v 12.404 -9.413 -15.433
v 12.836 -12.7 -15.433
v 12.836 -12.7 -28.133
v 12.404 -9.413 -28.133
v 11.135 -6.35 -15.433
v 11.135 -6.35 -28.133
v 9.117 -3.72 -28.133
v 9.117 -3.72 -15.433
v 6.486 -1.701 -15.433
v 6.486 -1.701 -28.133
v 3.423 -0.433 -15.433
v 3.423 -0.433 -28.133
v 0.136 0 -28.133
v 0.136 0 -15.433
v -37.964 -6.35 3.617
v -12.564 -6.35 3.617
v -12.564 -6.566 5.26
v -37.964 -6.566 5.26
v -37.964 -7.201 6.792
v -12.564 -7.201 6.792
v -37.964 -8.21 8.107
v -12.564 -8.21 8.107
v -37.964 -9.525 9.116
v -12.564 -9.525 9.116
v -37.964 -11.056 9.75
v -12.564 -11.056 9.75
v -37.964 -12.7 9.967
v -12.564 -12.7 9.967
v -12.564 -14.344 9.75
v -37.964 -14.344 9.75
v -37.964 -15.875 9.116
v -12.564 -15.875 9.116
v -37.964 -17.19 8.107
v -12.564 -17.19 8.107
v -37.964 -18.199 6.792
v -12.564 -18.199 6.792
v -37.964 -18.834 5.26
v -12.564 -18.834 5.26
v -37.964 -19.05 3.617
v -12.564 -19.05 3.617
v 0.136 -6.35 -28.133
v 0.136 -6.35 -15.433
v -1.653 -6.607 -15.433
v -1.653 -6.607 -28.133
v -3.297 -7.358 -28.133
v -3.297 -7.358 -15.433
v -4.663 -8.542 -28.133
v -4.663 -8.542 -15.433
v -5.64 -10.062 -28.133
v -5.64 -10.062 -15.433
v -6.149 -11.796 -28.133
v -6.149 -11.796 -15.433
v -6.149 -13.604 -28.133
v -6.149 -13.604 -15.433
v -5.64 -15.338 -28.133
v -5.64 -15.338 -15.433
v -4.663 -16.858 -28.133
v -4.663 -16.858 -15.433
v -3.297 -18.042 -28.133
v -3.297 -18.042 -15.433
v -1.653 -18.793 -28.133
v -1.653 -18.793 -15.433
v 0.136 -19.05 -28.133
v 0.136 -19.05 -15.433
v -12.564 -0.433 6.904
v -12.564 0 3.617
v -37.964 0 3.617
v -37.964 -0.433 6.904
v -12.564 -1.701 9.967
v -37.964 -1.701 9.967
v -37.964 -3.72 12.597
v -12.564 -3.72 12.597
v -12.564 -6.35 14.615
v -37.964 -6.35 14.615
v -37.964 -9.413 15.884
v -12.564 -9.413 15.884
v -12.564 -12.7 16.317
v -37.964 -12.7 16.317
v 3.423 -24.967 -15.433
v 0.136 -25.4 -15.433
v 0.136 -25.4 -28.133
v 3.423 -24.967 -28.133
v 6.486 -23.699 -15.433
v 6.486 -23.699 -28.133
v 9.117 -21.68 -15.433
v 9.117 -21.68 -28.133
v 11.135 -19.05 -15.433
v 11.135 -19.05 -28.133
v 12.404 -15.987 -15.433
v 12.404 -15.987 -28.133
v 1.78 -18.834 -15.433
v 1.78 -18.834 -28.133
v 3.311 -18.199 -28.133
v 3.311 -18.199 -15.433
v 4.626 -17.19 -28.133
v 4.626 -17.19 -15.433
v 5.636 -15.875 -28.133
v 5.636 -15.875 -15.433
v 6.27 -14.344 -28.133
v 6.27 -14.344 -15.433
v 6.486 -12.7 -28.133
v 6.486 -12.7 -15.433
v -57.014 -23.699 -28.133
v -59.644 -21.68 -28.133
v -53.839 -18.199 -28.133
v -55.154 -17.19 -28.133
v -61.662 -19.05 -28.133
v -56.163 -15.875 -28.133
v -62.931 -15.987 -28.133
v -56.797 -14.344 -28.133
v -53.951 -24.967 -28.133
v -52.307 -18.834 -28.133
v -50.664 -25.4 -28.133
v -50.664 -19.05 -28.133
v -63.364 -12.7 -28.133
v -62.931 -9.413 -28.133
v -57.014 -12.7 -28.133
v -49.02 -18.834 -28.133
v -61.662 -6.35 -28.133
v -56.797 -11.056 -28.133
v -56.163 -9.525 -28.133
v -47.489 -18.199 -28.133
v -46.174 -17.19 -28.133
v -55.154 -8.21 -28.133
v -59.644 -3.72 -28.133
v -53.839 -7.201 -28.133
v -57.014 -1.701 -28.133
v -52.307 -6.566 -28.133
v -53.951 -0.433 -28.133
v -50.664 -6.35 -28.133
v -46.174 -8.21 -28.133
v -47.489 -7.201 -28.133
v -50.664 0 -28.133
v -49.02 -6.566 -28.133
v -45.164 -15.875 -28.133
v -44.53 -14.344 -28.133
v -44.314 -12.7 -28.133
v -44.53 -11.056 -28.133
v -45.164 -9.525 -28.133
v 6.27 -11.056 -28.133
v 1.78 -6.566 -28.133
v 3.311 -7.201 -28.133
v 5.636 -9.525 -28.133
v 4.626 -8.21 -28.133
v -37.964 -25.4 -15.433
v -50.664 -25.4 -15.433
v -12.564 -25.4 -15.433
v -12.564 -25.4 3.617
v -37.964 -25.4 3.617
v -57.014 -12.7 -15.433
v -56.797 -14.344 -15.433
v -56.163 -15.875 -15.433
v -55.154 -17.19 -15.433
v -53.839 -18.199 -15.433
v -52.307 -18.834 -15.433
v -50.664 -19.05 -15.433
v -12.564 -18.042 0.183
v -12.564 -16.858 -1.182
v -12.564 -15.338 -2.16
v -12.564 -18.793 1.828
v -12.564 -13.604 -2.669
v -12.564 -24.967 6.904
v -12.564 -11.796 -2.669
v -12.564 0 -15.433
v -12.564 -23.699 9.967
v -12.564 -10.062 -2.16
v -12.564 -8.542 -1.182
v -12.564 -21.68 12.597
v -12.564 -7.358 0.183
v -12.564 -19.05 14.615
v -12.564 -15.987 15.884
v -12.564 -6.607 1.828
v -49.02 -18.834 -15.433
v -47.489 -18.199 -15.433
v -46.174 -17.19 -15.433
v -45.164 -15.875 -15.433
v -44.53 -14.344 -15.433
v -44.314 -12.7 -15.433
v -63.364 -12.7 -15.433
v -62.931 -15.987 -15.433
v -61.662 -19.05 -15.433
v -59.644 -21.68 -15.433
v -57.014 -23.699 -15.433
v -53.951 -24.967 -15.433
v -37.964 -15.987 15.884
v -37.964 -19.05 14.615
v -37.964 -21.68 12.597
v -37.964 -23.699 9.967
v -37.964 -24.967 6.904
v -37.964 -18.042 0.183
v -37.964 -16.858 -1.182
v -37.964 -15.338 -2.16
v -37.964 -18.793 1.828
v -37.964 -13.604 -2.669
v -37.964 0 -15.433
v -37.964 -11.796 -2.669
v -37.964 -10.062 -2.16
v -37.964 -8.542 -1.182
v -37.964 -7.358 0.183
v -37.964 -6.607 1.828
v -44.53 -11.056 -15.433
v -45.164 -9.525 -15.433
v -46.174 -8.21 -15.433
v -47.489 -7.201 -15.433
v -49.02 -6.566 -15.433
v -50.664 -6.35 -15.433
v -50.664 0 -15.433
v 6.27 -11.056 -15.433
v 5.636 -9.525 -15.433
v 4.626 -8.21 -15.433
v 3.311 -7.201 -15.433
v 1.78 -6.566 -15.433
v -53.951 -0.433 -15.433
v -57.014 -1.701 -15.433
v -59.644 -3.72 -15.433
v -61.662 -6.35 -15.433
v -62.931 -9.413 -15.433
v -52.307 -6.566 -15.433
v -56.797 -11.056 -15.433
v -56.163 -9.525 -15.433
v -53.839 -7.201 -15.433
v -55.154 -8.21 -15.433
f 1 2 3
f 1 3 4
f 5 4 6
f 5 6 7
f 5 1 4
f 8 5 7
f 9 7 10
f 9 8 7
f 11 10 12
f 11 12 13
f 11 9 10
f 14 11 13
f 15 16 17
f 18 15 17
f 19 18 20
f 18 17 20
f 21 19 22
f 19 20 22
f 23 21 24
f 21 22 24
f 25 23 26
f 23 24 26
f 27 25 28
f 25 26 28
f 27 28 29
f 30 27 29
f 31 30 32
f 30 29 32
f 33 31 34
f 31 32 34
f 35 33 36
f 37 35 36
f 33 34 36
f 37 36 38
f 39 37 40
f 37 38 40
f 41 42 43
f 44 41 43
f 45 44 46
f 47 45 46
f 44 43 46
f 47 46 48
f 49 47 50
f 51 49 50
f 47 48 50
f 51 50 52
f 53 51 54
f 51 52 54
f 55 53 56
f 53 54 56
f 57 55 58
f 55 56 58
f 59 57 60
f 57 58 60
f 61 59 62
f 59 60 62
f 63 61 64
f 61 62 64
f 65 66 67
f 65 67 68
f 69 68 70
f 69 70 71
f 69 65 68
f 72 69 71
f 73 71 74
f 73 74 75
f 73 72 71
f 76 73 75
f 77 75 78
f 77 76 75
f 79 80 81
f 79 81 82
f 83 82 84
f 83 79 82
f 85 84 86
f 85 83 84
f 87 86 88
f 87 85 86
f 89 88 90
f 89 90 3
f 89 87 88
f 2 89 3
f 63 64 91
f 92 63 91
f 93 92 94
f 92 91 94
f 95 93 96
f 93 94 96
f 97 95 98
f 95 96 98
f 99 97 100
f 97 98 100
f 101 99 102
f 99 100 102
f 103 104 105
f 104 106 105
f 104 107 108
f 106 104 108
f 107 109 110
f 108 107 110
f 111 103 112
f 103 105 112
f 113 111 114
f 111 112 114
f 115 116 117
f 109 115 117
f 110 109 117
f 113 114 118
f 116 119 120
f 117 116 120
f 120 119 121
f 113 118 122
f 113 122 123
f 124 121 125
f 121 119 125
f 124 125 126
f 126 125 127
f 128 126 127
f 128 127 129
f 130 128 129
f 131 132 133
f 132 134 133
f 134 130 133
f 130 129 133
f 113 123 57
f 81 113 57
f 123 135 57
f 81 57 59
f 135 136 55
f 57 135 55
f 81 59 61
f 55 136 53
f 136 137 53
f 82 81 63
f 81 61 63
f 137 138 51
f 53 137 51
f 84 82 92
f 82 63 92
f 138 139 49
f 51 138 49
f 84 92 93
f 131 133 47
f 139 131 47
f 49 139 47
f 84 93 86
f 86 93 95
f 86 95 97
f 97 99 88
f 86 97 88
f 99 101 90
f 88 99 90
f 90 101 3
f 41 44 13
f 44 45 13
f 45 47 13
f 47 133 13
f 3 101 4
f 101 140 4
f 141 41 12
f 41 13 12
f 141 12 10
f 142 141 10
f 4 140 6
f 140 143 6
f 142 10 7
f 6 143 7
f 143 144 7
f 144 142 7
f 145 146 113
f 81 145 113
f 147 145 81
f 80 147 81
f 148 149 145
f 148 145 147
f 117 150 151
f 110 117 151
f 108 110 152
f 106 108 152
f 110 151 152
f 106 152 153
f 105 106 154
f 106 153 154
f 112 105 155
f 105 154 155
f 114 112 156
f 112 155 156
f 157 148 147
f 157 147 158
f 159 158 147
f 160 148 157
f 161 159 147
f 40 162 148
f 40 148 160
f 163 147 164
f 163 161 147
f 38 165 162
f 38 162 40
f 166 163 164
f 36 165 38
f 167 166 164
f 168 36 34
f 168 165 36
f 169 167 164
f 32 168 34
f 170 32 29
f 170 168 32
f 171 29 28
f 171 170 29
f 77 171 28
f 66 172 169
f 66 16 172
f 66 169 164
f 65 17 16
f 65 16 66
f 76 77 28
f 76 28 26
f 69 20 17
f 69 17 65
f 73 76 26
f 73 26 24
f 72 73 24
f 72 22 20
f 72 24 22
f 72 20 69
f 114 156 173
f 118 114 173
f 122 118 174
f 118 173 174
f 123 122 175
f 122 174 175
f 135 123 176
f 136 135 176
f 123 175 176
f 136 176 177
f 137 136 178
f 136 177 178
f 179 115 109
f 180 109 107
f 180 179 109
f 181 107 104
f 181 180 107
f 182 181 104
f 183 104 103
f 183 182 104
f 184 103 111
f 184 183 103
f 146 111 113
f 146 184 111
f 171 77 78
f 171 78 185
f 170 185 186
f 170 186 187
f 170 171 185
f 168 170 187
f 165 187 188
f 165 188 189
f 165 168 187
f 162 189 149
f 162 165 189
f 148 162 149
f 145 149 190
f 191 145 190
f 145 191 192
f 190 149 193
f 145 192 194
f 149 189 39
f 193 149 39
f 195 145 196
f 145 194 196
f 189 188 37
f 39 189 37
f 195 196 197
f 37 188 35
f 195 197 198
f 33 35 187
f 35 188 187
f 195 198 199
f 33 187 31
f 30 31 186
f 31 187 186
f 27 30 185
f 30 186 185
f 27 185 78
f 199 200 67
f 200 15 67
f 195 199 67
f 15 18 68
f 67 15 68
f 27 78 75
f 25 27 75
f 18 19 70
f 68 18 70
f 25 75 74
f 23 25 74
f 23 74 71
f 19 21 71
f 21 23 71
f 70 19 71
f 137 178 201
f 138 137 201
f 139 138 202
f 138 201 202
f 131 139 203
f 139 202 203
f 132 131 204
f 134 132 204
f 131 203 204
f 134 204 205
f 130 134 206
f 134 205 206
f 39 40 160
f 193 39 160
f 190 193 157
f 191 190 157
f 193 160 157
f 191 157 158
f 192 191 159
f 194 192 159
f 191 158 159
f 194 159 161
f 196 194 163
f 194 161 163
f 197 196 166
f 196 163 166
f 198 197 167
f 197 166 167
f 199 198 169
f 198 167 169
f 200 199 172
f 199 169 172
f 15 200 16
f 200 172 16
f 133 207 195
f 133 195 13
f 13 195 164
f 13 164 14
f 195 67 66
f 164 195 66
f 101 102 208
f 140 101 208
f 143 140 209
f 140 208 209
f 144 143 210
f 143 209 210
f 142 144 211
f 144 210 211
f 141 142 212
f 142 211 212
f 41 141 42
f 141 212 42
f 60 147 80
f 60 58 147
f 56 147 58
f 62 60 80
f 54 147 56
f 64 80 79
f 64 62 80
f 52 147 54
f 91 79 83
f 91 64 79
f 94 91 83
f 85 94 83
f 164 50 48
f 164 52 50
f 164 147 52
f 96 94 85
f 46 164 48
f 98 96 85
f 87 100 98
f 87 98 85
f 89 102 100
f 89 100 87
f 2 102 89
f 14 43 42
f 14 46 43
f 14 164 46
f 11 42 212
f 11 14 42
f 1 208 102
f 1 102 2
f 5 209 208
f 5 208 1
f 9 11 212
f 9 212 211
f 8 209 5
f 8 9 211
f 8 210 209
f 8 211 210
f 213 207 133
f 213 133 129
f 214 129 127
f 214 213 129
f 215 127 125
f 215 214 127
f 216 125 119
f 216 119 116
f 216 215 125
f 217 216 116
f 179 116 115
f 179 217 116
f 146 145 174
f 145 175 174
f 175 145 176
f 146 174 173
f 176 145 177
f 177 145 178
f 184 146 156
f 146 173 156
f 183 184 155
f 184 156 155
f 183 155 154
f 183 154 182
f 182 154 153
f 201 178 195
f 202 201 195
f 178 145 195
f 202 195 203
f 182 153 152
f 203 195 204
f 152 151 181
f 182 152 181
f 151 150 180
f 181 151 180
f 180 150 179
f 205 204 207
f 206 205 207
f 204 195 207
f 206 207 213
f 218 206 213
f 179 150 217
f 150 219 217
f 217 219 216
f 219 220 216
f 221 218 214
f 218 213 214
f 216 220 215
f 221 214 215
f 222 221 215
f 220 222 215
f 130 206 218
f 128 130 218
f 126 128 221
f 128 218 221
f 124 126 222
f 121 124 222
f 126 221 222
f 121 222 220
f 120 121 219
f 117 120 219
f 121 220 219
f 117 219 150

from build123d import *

# Parameters (mm, degrees)
F1_DEPTH = 25.4
F3_DEPTH = 12.7
F5_DEPTH = 25.4
F7_DEPTH = 25.4
F9_DEPTH = 12.7


with BuildPart() as f1:
    # F0 (on Front) → F1 (new body)
    with BuildSketch(Plane.XZ):
        Polygon((-37.9636640911, -15.4334478322), (-50.6636640911, -15.4334478322), (-50.6636640911, -28.1334478322), (0.1363359089, -28.1334478322), (0.1363359089, -15.4334478322), (-12.5636640911, -15.4334478322), (-12.5636640911, 3.6165521678), (-37.9636640911, 3.6165521678), align=None)
    extrude(amount=F1_DEPTH)

    # F2 (on face) → F3 (join)
    with BuildSketch(Plane.XY.offset(-15.4334478322)):
        with BuildLine():
            ThreePointArc((12.8363359089, -12.7), (9.11659203, -3.7197438789), (0.1363359089, 0))
            Line((0.1363359089, 0), (0.1363359089, -12.7))
            Line((0.1363359089, -12.7), (12.8363359089, -12.7))
        make_face()
        with BuildLine():
            Line((12.8363359089, -12.7), (0.1363359089, -12.7))
            Line((0.1363359089, -12.7), (0.1363359089, -25.4))
            ThreePointArc((0.1363359089, -25.4), (9.11659203, -21.6802561211), (12.8363359089, -12.7))
        make_face()
        with BuildLine():
            Line((-50.6636640911, -12.7), (-50.6636640911, 0))
            ThreePointArc((-50.6636640911, 0), (-59.6439202122, -3.7197438789), (-63.3636640911, -12.7))
            Line((-63.3636640911, -12.7), (-50.6636640911, -12.7))
        make_face()
        with BuildLine():
            Line((-50.6636640911, -25.4), (-50.6636640911, -12.7))
            Line((-50.6636640911, -12.7), (-63.3636640911, -12.7))
            ThreePointArc((-63.3636640911, -12.7), (-59.6439202122, -21.6802561211), (-50.6636640911, -25.4))
        make_face()
    extrude(amount=-F3_DEPTH)

    # F4 (on face) → F5 (join)
    with BuildSketch(Plane.YZ.offset(-12.5636640911)):
        with BuildLine():
            ThreePointArc((-12.7, 16.3165521678), (-21.6802561211, 12.5968082888), (-25.4, 3.6165521678))
            Line((-25.4, 3.6165521678), (-12.7, 3.6165521678))
            Line((-12.7, 3.6165521678), (-12.7, 16.3165521678))
        make_face()
        with BuildLine():
            Line((-12.7, 16.3165521678), (-12.7, 3.6165521678))
            Line((-12.7, 3.6165521678), (0, 3.6165521678))
            ThreePointArc((0, 3.6165521678), (-3.7197438789, 12.5968082888), (-12.7, 16.3165521678))
        make_face()
    extrude(amount=-F5_DEPTH)

    # F6 (on face) → F7 (cut)
    with BuildSketch(Plane.YZ.offset(-12.5636640911)):
        with BuildLine():
            ThreePointArc((-6.35, 3.6165521678), (-8.2098719395, 8.1066802283), (-12.7, 9.9665521678))
            ThreePointArc((-12.7, 9.9665521678), (-17.1901280605, 8.1066802283), (-19.05, 3.6165521678))
            ThreePointArc((-19.05, 3.6165521678), (-12.7, -2.7334478322), (-6.35, 3.6165521678))
        make_face()
    extrude(amount=-F7_DEPTH, mode=Mode.SUBTRACT)

    # F8 (on face) → F9 (cut)
    with BuildSketch(Plane.XY.offset(-15.4334478322)):
        with BuildLine():
            ThreePointArc((-44.3136640911, -12.7), (-46.1735360306, -8.2098719395), (-50.6636640911, -6.35))
            ThreePointArc((-50.6636640911, -6.35), (-55.1537921516, -8.2098719395), (-57.0136640911, -12.7))
            ThreePointArc((-57.0136640911, -12.7), (-55.1537921516, -17.1901280605), (-50.6636640911, -19.05))
            ThreePointArc((-50.6636640911, -19.05), (-46.1735360306, -17.1901280605), (-44.3136640911, -12.7))
        make_face()
        with BuildLine():
            ThreePointArc((0.1363359089, -19.05), (4.6264639694, -17.1901280605), (6.4863359089, -12.7))
            ThreePointArc((6.4863359089, -12.7), (4.6264639694, -8.2098719395), (0.1363359089, -6.35))
            ThreePointArc((0.1363359089, -6.35), (-6.2136640911, -12.7), (0.1363359089, -19.05))
        make_face()
    extrude(amount=-F9_DEPTH, mode=Mode.SUBTRACT)


solid = f1.part
